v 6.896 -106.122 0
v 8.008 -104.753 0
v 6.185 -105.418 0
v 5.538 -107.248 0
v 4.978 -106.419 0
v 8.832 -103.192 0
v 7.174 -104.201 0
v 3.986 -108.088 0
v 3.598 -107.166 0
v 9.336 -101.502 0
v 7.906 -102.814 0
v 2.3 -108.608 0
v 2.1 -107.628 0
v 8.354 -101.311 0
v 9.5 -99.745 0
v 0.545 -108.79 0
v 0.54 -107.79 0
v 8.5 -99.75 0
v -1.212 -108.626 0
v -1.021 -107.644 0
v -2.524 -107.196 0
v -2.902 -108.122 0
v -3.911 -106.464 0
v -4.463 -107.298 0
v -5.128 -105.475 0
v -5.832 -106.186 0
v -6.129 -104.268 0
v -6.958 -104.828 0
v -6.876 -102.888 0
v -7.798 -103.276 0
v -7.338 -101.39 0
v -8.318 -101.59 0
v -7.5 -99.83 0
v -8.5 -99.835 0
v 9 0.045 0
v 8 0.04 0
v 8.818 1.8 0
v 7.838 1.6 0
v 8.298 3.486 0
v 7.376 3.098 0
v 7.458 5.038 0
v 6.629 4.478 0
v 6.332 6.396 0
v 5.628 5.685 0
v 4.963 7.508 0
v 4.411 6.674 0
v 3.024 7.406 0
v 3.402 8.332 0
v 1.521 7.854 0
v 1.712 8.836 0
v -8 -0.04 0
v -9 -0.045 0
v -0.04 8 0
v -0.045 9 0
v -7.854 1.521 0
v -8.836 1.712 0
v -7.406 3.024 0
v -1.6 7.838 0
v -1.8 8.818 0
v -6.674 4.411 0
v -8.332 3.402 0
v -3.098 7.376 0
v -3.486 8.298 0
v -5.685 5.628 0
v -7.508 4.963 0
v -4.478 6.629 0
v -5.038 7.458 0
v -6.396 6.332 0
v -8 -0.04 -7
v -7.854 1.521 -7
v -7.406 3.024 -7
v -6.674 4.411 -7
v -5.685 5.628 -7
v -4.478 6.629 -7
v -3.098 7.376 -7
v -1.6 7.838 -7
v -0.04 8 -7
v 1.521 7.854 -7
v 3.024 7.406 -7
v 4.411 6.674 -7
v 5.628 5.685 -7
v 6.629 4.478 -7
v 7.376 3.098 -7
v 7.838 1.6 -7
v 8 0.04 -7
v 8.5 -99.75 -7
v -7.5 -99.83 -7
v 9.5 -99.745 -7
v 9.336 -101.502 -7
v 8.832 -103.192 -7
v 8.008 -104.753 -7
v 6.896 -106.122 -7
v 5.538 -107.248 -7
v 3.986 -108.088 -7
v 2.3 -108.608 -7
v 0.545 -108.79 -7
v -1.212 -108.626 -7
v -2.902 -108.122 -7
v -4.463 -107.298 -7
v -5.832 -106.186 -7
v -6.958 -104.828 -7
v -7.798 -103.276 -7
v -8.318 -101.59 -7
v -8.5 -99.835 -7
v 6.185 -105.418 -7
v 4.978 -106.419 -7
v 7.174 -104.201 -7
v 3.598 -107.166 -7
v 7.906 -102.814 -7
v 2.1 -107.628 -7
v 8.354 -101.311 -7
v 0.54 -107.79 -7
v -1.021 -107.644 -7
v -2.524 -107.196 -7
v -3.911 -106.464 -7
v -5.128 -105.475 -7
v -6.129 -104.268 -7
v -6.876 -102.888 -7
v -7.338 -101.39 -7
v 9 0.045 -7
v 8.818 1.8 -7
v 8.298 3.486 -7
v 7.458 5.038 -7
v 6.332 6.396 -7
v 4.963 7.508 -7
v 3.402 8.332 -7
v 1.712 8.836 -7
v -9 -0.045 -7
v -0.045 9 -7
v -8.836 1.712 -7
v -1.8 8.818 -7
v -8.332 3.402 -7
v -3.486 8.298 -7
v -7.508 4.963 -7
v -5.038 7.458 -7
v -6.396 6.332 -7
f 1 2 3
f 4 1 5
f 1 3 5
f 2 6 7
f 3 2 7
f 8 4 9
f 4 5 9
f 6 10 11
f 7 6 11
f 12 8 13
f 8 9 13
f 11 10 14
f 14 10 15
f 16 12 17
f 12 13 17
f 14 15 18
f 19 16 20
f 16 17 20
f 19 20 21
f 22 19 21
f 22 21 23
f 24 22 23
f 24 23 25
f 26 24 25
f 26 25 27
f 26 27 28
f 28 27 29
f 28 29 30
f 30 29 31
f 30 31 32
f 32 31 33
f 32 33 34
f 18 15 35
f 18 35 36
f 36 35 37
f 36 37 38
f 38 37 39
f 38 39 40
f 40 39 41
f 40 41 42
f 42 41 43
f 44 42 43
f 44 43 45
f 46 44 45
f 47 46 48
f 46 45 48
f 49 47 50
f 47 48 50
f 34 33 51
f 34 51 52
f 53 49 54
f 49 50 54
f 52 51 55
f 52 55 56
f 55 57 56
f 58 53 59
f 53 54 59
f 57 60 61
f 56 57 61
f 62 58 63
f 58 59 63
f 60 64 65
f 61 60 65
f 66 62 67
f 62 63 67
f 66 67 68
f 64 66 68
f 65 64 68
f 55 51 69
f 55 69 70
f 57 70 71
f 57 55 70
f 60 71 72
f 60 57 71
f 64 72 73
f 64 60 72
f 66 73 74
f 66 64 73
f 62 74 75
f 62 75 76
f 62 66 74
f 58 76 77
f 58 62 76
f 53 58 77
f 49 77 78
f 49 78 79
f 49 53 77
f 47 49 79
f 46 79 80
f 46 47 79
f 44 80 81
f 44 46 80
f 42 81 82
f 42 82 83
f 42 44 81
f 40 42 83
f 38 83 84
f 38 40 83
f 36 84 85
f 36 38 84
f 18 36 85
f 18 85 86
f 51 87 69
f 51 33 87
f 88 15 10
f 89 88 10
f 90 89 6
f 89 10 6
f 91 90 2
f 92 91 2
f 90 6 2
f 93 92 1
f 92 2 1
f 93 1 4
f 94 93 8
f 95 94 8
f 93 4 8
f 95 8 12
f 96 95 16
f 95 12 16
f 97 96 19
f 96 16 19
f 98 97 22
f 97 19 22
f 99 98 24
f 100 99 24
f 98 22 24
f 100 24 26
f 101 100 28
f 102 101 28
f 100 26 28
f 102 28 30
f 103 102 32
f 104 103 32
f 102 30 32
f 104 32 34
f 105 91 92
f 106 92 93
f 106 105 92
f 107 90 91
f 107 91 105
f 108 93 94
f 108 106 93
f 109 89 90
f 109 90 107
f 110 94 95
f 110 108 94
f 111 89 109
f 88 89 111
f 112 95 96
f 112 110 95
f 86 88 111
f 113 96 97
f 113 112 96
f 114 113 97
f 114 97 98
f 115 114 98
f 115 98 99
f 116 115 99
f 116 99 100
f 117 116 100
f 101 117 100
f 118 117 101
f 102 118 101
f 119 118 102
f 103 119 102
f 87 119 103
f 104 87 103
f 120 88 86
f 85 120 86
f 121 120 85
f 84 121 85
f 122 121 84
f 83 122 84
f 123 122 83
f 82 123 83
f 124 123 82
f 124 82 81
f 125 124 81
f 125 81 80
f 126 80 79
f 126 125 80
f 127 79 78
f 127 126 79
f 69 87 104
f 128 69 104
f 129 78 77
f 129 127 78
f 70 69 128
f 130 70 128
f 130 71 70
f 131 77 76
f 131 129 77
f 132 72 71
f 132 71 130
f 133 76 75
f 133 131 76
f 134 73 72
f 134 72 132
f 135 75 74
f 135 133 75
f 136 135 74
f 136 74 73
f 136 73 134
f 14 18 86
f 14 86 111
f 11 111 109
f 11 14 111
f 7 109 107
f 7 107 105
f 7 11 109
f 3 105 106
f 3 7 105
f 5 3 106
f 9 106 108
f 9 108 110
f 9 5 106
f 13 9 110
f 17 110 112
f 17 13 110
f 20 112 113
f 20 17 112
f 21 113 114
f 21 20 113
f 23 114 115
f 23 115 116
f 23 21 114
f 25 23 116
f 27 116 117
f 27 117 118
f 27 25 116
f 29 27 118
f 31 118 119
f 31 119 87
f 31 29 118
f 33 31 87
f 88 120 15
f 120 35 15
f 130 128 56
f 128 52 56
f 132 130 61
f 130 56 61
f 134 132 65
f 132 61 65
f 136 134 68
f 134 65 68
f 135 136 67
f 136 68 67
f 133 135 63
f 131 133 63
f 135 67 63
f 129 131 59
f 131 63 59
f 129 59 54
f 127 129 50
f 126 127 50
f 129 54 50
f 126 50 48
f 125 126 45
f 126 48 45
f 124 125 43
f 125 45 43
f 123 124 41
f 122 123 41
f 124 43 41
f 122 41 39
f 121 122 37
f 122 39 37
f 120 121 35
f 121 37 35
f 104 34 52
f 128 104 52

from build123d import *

# Parameters (mm, degrees)
EXTRUDE_THIN1_START = -3.5
EXTRUDE_THIN1_DEPTH = 3.5


with BuildPart() as part:
    # Sketch2 → Extrude-Thin1 (new, symmetric)
    with BuildSketch(Plane.XY.offset(EXTRUDE_THIN1_START)):
        with BuildLine():
            Line((-8.499887028, -99.835094133), (-8.999887028, -0.045094133))
            ThreePointArc((-8.999887028, -0.045094133), (-0.045094133, 8.999887028), (8.999887028, 0.045094133))
            Line((8.999887028, 0.045094133), (9.499887028, -99.744905867))
            ThreePointArc((9.499887028, -99.744905867), (0.545094133, -108.789887028), (-8.499887028, -99.835094133))
        make_face()
        with BuildLine():
            Line((-7.499899581, -99.830083674), (-7.999899581, -0.040083674))
            ThreePointArc((-7.999899581, -0.040083674), (-0.040083674, 7.999899581), (7.999899581, 0.040083674))
            Line((7.999899581, 0.040083674), (8.499899581, -99.749916326))
            ThreePointArc((8.499899581, -99.749916326), (0.540083674, -107.789899581), (-7.499899581, -99.830083674))
        make_face(mode=Mode.SUBTRACT)
    extrude(amount=EXTRUDE_THIN1_DEPTH, both=True)


solid = part.part
